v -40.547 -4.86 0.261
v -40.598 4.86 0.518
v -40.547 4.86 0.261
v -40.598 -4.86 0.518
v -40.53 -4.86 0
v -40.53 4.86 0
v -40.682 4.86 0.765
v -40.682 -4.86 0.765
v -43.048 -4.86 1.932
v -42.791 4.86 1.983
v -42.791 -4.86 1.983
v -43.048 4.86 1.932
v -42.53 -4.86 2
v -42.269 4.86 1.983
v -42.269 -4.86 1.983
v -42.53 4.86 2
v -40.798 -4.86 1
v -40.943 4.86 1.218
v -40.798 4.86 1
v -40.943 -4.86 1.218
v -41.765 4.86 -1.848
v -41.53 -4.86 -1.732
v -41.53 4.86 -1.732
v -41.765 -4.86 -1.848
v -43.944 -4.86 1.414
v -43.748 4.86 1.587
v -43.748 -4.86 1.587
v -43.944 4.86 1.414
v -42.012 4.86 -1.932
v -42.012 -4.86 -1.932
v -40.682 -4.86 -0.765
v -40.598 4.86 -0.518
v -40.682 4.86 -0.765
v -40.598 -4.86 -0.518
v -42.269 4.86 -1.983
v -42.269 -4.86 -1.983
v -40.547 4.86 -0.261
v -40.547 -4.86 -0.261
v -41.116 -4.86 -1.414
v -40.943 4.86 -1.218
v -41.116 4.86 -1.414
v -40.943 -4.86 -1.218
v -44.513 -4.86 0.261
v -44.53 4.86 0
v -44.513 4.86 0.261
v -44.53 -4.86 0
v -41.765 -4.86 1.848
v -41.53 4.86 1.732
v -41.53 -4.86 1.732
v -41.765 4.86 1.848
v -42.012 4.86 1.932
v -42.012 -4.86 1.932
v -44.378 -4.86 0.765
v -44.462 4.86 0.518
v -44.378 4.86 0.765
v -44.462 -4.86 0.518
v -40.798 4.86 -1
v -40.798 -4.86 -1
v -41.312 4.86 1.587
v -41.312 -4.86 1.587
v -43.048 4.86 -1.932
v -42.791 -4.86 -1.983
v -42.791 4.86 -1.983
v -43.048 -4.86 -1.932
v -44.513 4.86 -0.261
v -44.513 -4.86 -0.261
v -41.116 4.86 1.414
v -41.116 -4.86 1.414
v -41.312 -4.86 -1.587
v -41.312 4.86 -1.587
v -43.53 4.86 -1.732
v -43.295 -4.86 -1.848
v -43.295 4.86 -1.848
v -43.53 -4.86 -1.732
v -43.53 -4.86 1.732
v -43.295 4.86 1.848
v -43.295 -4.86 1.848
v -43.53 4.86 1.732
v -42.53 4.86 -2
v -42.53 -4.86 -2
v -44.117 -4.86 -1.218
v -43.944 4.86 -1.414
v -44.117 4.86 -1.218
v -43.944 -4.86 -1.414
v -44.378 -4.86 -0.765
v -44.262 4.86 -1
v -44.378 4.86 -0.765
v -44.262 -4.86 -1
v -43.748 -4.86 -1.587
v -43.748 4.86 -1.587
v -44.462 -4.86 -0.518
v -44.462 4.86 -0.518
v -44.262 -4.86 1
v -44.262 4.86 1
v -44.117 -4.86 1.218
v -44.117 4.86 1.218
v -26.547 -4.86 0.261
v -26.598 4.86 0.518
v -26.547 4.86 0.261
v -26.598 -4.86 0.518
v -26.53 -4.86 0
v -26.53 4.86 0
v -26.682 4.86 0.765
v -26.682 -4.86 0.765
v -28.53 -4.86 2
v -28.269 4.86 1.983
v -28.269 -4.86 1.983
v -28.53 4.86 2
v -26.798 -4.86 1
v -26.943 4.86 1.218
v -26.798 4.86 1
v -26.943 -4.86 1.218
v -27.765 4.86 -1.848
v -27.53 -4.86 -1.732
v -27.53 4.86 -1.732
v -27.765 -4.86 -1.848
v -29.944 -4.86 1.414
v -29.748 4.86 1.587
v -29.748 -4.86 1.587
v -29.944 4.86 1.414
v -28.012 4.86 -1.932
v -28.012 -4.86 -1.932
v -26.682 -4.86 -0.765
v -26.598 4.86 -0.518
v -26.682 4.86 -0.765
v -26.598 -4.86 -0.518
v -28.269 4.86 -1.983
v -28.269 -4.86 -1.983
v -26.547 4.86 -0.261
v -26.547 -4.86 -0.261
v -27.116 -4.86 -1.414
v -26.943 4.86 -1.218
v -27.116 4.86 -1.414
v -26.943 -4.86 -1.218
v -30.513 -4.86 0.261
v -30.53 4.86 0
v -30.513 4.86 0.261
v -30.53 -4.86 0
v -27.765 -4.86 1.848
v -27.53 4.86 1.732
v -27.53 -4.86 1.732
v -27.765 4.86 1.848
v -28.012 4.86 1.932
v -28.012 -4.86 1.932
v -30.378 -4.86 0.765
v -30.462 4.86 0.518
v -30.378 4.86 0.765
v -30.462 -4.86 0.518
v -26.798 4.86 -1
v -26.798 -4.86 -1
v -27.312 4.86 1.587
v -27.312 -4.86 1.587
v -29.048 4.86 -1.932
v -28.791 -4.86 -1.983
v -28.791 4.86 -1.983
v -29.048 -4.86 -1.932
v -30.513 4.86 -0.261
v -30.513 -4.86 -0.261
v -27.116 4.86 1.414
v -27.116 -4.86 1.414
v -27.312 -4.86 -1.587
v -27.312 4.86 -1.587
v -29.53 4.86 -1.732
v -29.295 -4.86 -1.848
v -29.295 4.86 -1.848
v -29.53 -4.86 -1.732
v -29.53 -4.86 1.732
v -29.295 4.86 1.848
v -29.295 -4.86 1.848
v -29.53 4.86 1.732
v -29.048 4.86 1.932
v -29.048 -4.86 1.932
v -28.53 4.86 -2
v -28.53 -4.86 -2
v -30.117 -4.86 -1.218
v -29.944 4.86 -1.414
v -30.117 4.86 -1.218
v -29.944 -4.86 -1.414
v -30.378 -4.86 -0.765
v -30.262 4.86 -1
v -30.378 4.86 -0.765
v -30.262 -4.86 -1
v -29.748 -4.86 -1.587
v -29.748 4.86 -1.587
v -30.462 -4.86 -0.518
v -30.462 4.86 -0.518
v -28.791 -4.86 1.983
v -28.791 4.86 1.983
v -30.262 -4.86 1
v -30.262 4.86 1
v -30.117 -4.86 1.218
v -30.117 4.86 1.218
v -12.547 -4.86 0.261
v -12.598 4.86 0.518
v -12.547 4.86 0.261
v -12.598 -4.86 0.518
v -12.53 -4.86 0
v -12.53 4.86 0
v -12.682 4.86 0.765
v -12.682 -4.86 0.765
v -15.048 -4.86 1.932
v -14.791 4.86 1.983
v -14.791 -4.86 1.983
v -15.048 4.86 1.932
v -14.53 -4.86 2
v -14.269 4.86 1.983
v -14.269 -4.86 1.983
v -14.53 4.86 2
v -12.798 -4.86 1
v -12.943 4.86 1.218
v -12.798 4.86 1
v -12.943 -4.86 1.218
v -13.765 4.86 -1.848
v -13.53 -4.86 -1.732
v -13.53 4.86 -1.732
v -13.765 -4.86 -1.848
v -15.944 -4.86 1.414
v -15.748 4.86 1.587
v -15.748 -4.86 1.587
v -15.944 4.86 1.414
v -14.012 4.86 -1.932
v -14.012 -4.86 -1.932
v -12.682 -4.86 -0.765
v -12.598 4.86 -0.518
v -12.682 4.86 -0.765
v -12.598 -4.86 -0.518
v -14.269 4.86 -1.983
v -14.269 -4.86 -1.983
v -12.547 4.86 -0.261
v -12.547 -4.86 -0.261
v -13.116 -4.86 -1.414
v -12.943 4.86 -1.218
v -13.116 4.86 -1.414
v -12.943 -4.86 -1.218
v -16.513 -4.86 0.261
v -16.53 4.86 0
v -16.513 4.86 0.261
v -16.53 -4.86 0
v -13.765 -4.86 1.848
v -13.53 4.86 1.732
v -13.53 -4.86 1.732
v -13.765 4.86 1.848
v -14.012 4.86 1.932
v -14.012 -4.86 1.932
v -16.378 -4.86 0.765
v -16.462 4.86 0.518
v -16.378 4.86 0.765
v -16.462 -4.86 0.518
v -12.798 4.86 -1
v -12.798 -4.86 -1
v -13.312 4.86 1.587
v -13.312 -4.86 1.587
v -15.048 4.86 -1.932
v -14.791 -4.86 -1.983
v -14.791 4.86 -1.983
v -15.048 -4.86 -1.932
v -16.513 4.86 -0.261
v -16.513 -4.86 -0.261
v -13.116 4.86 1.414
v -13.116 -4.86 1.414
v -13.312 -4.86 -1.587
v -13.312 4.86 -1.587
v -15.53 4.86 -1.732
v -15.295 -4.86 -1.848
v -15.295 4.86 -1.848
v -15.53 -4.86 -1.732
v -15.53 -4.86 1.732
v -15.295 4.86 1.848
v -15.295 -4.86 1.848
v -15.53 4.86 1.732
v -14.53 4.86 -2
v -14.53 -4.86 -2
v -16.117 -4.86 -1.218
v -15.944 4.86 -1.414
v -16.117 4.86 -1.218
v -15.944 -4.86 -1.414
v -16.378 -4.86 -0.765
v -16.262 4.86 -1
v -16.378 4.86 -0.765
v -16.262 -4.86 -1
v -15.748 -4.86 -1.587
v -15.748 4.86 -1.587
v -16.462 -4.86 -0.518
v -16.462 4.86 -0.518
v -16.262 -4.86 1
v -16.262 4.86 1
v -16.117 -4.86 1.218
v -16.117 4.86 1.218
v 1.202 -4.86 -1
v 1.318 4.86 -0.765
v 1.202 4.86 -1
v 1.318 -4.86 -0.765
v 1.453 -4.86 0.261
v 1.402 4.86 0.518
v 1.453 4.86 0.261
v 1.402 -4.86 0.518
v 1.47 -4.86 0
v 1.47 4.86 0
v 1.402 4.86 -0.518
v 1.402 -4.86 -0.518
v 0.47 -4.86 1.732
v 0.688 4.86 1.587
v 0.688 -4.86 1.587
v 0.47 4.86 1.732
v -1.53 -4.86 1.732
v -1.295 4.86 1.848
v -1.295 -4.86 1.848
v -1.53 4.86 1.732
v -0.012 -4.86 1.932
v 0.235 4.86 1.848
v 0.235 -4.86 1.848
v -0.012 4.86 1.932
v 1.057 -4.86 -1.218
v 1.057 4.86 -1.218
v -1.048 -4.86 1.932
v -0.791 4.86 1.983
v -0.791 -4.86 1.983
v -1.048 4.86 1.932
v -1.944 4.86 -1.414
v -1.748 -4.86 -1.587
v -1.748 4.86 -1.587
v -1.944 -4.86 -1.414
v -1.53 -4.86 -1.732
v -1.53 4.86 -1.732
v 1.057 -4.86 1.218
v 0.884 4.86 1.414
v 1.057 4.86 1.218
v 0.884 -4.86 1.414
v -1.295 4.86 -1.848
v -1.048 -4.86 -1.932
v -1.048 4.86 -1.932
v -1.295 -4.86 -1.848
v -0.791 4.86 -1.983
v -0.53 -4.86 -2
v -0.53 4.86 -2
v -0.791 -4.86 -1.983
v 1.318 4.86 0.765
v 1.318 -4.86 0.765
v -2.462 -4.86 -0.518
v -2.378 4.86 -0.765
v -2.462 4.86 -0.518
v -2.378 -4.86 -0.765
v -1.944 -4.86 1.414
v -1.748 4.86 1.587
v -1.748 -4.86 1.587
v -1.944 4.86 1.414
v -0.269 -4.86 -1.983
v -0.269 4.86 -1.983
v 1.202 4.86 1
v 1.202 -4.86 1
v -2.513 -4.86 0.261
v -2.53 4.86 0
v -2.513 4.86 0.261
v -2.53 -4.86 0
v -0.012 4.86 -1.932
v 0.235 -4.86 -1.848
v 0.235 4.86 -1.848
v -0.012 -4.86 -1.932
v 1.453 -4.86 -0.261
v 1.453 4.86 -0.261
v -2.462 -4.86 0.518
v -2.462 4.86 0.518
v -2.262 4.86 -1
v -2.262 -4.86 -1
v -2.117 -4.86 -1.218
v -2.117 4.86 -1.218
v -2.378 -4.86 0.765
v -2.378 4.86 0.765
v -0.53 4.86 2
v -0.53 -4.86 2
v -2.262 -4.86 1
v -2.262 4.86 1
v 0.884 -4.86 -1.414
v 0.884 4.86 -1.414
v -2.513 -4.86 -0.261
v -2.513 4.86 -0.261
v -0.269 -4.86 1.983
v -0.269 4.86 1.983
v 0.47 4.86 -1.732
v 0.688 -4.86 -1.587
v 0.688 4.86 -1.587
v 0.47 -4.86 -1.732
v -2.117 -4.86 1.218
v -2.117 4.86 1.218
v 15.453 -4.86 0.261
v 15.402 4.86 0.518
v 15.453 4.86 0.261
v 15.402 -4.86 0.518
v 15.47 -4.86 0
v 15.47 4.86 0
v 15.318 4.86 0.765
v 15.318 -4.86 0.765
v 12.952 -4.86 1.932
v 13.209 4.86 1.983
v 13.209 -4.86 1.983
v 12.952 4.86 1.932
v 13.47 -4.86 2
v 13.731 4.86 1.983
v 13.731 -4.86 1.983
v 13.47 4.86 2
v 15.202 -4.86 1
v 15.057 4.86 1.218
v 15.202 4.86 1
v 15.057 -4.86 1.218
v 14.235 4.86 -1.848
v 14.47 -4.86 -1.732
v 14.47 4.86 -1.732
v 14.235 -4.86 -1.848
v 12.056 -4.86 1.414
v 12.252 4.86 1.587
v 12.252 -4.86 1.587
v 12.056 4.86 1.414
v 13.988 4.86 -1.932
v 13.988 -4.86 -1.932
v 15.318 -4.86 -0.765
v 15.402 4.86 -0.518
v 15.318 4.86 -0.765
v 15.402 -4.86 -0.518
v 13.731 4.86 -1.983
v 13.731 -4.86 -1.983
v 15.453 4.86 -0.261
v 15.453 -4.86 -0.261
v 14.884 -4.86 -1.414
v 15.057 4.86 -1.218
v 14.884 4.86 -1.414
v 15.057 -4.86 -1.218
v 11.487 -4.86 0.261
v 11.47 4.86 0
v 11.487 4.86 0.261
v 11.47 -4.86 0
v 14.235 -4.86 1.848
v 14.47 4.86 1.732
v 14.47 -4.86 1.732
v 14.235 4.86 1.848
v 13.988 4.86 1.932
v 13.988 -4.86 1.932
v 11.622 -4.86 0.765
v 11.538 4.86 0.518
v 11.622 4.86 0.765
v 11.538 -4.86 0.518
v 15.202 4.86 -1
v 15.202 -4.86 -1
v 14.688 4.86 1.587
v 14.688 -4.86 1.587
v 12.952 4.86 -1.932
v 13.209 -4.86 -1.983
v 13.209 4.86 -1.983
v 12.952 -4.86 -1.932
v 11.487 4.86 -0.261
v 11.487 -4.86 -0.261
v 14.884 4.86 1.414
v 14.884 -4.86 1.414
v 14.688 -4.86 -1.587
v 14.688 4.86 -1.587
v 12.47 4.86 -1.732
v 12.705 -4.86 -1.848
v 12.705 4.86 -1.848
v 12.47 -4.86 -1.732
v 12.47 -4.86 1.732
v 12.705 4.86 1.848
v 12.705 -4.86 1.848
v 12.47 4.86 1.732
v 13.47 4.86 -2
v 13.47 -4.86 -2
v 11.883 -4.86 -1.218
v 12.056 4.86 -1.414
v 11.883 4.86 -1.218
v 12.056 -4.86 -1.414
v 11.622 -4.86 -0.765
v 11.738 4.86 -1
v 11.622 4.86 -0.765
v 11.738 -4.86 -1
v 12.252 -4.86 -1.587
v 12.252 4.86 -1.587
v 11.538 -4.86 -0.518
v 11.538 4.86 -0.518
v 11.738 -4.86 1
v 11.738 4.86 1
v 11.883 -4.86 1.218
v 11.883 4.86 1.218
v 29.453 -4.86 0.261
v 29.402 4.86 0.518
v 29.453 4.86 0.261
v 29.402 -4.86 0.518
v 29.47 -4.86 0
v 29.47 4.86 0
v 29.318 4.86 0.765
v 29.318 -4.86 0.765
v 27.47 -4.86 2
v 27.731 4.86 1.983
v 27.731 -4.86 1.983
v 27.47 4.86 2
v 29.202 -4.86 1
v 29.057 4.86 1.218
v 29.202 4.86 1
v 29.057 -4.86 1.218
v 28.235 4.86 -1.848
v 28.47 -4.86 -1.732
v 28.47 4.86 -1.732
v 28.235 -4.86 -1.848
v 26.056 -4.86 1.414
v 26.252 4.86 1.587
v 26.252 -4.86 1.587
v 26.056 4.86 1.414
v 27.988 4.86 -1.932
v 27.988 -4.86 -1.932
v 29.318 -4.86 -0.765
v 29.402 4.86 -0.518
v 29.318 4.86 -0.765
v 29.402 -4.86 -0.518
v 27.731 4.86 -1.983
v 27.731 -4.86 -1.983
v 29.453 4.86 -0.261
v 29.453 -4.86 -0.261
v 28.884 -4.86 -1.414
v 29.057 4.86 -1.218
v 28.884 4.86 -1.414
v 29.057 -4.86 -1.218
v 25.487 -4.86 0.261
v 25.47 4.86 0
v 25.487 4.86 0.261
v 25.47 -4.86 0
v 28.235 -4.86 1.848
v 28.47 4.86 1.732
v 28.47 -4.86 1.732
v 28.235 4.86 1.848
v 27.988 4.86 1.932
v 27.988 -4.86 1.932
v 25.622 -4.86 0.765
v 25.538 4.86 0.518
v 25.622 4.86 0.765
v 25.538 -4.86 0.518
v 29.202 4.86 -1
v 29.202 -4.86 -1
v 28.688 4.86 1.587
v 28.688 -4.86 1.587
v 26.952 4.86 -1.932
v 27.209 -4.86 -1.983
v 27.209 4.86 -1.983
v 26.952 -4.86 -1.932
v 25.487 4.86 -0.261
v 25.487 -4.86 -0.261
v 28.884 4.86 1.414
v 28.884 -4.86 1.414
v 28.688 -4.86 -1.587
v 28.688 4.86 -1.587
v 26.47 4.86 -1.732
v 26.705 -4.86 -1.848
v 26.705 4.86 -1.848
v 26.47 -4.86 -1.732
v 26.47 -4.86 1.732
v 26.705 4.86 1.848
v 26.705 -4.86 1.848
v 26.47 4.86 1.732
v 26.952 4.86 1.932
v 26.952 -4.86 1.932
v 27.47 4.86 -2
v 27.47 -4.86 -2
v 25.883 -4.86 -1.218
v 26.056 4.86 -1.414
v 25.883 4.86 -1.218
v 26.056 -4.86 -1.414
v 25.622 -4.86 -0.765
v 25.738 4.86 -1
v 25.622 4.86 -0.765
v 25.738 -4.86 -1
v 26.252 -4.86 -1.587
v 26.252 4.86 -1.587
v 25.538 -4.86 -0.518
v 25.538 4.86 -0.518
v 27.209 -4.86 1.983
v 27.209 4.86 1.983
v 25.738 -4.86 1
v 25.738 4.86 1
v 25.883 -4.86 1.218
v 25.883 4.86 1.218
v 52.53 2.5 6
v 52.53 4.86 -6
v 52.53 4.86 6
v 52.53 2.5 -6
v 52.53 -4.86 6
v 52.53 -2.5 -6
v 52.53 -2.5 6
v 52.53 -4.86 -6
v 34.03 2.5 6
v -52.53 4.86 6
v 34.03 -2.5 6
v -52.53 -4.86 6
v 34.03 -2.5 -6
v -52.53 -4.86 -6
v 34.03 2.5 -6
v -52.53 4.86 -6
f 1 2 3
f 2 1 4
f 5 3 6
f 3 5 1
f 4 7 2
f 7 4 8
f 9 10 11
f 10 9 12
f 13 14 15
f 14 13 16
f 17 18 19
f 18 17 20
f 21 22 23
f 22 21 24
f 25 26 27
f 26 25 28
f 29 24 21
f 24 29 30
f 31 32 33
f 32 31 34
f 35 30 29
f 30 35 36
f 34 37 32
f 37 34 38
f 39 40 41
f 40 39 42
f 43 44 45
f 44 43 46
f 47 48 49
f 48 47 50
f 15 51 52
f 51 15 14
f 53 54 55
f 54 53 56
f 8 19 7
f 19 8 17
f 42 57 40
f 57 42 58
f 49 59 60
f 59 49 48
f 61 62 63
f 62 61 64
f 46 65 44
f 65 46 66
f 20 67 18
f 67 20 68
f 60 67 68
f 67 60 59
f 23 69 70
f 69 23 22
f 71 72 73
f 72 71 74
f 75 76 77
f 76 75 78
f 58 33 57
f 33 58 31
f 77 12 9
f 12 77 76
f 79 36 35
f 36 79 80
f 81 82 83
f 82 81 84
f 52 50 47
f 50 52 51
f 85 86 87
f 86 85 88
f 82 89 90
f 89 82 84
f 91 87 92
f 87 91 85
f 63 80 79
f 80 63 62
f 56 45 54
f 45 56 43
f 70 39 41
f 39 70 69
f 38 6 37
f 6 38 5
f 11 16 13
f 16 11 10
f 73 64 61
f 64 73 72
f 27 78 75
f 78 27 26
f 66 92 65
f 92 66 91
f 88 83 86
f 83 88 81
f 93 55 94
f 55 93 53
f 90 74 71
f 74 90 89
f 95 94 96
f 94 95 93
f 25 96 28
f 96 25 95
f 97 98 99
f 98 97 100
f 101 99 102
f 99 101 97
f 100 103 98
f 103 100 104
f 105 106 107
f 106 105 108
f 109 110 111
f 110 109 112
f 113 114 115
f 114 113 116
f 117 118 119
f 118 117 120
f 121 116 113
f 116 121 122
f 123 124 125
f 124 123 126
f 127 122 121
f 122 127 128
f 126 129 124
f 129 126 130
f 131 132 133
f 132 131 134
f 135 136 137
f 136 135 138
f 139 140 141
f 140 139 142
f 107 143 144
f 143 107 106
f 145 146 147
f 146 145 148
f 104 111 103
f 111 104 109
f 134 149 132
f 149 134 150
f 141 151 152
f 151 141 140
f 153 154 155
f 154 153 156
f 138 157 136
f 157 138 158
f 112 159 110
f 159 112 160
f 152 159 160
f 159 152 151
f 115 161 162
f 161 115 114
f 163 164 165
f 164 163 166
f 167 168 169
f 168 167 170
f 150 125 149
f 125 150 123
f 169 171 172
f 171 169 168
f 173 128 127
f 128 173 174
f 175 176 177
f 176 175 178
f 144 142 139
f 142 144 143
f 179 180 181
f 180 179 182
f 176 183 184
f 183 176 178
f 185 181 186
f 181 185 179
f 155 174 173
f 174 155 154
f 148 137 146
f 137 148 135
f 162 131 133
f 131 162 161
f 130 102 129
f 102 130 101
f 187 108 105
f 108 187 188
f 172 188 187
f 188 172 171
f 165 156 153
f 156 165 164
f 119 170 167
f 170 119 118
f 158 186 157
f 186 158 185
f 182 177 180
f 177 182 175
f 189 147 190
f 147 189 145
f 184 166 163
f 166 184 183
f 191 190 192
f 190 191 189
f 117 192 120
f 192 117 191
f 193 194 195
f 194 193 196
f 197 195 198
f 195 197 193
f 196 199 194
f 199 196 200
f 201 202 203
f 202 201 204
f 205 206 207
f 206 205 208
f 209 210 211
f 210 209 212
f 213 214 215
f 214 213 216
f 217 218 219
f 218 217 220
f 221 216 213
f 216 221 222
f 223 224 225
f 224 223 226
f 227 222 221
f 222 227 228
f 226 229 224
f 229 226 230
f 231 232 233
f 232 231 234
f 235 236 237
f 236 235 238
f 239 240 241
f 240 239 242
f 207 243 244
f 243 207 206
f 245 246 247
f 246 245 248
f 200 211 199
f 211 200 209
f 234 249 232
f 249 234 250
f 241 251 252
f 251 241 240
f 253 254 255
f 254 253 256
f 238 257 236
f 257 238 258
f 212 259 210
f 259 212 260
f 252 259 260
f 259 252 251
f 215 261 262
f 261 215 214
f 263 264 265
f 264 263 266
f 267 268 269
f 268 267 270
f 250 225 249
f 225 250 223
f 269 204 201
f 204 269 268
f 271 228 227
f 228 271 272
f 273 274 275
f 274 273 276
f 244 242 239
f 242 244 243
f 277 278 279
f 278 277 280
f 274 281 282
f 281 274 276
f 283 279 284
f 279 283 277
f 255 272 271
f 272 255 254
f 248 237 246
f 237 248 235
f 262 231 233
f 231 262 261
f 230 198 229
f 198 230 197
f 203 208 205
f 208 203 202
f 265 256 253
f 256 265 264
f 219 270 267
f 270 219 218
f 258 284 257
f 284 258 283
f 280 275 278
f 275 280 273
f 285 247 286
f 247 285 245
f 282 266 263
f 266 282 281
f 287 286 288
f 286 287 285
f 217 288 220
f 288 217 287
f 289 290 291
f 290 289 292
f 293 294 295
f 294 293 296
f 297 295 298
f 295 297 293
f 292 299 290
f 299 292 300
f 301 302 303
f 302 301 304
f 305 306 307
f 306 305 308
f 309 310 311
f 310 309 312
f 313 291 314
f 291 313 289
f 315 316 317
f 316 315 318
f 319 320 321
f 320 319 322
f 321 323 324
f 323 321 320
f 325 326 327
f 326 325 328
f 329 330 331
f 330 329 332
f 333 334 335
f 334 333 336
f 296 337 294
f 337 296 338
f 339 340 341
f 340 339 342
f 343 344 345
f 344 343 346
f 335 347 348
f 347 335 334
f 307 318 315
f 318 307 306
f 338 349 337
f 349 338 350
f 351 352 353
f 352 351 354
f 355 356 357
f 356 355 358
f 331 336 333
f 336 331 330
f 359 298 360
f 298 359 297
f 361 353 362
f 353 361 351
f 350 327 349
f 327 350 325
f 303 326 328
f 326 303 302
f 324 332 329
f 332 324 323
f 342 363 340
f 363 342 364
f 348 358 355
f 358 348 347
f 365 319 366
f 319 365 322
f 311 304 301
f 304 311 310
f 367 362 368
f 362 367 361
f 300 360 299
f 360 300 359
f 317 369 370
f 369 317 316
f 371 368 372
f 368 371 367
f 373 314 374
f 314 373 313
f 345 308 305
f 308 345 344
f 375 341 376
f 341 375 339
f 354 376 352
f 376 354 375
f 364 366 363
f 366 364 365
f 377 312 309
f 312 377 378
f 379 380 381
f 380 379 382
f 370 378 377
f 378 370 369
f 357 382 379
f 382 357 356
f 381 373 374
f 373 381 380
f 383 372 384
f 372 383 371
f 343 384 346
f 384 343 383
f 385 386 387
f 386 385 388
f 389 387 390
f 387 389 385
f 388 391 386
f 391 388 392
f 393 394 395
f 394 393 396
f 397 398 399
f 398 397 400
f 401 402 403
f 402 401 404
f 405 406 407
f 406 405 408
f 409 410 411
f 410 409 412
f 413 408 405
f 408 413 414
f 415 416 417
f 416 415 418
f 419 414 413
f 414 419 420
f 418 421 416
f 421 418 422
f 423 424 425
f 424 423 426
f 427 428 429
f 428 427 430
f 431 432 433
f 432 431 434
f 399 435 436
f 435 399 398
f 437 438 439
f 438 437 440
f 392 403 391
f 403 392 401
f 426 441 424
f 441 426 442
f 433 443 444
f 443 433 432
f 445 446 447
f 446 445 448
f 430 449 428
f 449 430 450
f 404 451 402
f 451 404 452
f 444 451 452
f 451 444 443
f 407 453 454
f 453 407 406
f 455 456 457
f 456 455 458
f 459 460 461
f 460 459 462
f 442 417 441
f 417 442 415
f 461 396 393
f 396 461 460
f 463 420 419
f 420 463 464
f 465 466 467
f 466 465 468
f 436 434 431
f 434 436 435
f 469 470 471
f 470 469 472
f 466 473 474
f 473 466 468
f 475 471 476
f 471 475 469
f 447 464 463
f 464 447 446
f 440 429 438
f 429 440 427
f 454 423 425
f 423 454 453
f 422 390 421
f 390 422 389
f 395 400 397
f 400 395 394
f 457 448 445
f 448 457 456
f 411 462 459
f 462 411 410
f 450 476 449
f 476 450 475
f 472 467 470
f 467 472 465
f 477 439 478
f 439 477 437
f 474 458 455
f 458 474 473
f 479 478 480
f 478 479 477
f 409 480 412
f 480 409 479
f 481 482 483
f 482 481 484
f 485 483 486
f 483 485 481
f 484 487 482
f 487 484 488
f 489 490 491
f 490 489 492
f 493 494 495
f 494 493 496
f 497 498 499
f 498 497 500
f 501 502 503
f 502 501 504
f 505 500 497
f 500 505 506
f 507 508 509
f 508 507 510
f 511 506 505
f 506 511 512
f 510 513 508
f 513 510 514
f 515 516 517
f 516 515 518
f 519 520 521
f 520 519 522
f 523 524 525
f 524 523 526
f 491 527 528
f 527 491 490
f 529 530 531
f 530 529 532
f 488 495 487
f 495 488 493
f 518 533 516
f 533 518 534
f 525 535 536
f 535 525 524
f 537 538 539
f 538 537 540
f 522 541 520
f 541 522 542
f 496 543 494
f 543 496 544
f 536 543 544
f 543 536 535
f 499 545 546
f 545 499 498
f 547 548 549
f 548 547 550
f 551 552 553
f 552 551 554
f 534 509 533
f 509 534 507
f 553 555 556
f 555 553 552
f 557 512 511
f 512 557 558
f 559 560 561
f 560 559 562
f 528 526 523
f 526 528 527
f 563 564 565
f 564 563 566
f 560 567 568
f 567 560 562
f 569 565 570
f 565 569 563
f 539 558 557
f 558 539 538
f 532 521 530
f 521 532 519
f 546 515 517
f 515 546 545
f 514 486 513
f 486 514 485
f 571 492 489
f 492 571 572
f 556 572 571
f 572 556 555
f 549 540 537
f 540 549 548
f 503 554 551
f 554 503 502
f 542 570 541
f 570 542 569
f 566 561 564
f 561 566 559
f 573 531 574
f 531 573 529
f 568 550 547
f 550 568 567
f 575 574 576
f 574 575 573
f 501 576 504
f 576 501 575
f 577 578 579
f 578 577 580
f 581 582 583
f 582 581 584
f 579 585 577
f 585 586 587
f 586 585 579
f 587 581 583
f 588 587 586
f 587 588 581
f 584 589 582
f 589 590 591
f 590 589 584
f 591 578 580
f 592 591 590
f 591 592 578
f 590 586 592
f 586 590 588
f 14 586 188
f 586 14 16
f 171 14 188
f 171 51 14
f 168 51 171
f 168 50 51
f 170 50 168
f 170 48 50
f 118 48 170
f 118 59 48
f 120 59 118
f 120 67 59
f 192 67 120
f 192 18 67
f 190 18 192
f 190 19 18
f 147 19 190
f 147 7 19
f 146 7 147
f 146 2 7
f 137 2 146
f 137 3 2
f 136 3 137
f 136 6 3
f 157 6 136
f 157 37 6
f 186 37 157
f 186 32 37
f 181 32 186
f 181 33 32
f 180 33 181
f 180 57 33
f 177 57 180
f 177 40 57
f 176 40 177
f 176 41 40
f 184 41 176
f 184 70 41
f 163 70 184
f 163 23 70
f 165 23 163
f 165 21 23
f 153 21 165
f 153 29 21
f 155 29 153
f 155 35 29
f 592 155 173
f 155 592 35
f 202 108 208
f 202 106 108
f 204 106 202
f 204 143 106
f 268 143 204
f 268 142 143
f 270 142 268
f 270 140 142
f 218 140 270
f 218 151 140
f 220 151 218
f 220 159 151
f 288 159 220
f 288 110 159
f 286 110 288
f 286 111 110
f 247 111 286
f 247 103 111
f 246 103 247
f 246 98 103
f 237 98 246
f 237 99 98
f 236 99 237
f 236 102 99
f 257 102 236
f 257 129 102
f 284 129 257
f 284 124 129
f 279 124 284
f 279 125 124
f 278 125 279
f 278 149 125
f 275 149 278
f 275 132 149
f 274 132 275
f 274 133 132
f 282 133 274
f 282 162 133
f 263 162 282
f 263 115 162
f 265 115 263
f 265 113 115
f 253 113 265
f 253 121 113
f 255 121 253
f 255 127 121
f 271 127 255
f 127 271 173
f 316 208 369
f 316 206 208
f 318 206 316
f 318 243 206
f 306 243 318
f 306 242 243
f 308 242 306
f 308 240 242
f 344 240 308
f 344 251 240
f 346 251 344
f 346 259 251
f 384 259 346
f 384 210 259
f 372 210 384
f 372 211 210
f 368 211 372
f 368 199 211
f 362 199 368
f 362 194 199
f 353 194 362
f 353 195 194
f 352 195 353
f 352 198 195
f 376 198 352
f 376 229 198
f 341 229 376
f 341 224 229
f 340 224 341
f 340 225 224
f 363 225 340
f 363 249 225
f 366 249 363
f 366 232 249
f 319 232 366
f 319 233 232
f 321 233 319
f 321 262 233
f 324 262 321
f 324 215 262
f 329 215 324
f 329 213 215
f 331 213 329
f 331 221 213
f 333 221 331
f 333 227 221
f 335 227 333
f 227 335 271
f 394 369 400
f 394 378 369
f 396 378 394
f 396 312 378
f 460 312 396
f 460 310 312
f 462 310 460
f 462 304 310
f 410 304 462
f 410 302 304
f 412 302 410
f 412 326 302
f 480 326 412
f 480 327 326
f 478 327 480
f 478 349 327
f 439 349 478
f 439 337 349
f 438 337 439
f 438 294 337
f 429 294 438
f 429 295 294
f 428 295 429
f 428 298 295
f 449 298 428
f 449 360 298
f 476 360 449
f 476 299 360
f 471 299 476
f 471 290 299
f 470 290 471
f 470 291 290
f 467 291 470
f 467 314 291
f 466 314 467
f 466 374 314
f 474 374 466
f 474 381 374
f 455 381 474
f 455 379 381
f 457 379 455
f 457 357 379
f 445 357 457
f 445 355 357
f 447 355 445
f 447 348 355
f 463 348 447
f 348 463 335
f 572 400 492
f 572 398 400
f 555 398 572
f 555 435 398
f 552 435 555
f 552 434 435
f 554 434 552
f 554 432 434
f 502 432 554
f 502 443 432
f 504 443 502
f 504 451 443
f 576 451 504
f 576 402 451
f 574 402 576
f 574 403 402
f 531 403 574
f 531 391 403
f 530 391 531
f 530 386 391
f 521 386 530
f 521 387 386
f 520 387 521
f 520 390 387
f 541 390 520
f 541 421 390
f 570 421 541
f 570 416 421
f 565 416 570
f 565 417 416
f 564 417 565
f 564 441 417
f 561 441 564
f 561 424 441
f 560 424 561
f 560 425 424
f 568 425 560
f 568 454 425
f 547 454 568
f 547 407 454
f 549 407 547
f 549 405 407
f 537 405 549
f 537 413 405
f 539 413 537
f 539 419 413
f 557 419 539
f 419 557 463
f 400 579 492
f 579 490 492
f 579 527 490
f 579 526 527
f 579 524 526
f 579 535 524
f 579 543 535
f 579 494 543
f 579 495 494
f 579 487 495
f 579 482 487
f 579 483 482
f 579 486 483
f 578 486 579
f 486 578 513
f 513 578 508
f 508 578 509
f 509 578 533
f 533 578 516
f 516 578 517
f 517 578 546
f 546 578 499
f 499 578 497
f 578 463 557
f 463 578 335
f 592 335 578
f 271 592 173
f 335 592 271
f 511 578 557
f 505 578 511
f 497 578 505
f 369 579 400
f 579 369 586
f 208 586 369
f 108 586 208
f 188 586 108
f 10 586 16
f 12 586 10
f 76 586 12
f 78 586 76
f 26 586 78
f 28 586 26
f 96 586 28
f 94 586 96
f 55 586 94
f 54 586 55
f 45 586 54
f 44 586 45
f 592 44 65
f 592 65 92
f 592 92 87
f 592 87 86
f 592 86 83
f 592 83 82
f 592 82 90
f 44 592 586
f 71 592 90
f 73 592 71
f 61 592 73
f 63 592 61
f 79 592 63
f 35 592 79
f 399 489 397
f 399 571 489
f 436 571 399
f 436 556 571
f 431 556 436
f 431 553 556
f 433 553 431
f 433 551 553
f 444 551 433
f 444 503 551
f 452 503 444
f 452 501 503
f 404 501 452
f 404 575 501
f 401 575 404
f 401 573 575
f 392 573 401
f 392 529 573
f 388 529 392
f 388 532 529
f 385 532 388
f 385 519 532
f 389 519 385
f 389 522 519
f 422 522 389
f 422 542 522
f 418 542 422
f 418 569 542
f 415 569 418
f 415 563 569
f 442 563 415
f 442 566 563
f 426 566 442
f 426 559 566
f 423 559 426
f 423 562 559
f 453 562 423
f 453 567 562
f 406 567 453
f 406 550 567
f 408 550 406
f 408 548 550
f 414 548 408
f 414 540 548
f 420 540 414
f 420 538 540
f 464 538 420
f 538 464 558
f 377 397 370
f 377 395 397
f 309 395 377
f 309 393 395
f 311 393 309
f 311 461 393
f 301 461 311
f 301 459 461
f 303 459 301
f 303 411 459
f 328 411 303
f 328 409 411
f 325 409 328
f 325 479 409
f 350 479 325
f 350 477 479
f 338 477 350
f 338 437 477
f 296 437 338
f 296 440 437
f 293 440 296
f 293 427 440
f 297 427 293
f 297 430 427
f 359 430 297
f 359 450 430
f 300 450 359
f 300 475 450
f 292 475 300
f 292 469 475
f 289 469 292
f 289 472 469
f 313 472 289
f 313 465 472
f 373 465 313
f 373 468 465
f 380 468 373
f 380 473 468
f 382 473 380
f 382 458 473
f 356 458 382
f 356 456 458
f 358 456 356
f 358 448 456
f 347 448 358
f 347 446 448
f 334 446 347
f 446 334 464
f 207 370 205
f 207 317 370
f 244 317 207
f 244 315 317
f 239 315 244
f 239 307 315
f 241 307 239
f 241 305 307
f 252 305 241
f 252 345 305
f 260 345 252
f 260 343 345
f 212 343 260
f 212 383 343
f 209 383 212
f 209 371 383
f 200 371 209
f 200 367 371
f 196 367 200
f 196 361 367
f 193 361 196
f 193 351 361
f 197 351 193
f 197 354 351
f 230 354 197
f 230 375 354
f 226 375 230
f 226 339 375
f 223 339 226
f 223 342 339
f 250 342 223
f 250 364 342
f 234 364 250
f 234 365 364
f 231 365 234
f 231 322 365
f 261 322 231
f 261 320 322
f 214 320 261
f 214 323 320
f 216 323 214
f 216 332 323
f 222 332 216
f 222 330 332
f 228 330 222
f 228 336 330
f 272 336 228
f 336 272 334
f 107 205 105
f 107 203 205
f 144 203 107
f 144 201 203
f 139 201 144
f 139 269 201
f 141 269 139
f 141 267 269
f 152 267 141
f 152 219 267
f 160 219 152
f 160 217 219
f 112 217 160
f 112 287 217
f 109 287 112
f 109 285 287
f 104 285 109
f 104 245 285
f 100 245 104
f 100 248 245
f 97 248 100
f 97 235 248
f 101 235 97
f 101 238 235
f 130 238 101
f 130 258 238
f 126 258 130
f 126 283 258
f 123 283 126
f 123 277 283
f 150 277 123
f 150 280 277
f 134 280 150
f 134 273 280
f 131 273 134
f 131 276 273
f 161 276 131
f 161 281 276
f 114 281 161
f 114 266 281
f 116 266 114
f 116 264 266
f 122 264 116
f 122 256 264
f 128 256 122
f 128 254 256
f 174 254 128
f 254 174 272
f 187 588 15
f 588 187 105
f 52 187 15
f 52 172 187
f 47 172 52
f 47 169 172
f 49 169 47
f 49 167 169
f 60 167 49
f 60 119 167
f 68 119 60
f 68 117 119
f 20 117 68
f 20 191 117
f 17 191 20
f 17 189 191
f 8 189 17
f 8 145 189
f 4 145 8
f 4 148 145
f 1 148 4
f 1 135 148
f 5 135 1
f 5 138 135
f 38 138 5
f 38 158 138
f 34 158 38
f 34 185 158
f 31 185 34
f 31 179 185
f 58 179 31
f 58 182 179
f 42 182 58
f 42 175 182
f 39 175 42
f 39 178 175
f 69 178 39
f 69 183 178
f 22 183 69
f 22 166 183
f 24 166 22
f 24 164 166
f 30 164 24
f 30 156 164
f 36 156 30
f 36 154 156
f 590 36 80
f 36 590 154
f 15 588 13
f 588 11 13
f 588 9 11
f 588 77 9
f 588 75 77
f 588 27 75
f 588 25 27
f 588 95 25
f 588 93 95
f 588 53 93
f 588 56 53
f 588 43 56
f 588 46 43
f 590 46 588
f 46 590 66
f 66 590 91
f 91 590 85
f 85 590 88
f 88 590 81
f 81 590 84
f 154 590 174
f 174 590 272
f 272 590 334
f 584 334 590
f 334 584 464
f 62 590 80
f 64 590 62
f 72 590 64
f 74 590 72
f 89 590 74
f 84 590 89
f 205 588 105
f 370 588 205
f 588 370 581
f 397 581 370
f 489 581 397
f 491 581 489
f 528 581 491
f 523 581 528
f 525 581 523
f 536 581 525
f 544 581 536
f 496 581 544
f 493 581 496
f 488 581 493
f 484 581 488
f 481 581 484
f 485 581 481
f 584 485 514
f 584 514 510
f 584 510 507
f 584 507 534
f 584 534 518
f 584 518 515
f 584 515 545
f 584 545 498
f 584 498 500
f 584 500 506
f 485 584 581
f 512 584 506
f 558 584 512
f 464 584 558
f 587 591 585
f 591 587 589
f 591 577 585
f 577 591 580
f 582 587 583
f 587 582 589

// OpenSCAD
// Parameters
L = 105.06; //[52.53:210.12:0.01]
W = 9.72;   //[4.86:19.44:0.01]
H = 12;     //[6:24:0.01]

hole_count = 6;          //[2:20:1]
hole_d = 4;              //[2:8:0.01]
hole_pitch = 14;         //[7:28:0.01]
hole_edge_margin = 10;   //[5:20:0.01]

fork_slot_len = 18;      //[9:36:0.01]
fork_slot_w = 5;         //[2.5:10:0.01]
tine_w = 2.36;           //[1.18:4.72:0.01]

op_overlap = 1;          //[0.5:2:0.1]
hole_cut_extra = 2;      //[1:6:0.1]
slot_cut_extra = 2;      //[1:6:0.1]

// Main bar body
module main_bar_body() {
  cube([L, W, H], center=true);
}

// Through holes (axis along Y, so holes go through width W)
module through_hole(x_offset) {
  translate([x_offset, 0, 0])
    rotate([90, 0, 0])
      cylinder(h=W + hole_cut_extra, r=hole_d/2, center=true, $fn=48);
}

module through_hole_pattern() {
  for (i = [0:hole_count-1])
    through_hole(-L/2 + hole_edge_margin + i*hole_pitch);
}

// Fork slot: rectangular opening between tines, open to the end (at +X)
module fork_end_u_slot() {
  // Slot starts at the end face x=+L/2 and extends inward by fork_slot_len
  translate([L/2 - fork_slot_len/2, 0, 0])
    cube([fork_slot_len + op_overlap, fork_slot_w, H + slot_cut_extra], center=true);
}

// Complete model (single connected solid)
module complete_model() {
  difference() {
    main_bar_body();
    through_hole_pattern();
    fork_end_u_slot(); // creates the fork opening between two tines
  }
}

complete_model();
